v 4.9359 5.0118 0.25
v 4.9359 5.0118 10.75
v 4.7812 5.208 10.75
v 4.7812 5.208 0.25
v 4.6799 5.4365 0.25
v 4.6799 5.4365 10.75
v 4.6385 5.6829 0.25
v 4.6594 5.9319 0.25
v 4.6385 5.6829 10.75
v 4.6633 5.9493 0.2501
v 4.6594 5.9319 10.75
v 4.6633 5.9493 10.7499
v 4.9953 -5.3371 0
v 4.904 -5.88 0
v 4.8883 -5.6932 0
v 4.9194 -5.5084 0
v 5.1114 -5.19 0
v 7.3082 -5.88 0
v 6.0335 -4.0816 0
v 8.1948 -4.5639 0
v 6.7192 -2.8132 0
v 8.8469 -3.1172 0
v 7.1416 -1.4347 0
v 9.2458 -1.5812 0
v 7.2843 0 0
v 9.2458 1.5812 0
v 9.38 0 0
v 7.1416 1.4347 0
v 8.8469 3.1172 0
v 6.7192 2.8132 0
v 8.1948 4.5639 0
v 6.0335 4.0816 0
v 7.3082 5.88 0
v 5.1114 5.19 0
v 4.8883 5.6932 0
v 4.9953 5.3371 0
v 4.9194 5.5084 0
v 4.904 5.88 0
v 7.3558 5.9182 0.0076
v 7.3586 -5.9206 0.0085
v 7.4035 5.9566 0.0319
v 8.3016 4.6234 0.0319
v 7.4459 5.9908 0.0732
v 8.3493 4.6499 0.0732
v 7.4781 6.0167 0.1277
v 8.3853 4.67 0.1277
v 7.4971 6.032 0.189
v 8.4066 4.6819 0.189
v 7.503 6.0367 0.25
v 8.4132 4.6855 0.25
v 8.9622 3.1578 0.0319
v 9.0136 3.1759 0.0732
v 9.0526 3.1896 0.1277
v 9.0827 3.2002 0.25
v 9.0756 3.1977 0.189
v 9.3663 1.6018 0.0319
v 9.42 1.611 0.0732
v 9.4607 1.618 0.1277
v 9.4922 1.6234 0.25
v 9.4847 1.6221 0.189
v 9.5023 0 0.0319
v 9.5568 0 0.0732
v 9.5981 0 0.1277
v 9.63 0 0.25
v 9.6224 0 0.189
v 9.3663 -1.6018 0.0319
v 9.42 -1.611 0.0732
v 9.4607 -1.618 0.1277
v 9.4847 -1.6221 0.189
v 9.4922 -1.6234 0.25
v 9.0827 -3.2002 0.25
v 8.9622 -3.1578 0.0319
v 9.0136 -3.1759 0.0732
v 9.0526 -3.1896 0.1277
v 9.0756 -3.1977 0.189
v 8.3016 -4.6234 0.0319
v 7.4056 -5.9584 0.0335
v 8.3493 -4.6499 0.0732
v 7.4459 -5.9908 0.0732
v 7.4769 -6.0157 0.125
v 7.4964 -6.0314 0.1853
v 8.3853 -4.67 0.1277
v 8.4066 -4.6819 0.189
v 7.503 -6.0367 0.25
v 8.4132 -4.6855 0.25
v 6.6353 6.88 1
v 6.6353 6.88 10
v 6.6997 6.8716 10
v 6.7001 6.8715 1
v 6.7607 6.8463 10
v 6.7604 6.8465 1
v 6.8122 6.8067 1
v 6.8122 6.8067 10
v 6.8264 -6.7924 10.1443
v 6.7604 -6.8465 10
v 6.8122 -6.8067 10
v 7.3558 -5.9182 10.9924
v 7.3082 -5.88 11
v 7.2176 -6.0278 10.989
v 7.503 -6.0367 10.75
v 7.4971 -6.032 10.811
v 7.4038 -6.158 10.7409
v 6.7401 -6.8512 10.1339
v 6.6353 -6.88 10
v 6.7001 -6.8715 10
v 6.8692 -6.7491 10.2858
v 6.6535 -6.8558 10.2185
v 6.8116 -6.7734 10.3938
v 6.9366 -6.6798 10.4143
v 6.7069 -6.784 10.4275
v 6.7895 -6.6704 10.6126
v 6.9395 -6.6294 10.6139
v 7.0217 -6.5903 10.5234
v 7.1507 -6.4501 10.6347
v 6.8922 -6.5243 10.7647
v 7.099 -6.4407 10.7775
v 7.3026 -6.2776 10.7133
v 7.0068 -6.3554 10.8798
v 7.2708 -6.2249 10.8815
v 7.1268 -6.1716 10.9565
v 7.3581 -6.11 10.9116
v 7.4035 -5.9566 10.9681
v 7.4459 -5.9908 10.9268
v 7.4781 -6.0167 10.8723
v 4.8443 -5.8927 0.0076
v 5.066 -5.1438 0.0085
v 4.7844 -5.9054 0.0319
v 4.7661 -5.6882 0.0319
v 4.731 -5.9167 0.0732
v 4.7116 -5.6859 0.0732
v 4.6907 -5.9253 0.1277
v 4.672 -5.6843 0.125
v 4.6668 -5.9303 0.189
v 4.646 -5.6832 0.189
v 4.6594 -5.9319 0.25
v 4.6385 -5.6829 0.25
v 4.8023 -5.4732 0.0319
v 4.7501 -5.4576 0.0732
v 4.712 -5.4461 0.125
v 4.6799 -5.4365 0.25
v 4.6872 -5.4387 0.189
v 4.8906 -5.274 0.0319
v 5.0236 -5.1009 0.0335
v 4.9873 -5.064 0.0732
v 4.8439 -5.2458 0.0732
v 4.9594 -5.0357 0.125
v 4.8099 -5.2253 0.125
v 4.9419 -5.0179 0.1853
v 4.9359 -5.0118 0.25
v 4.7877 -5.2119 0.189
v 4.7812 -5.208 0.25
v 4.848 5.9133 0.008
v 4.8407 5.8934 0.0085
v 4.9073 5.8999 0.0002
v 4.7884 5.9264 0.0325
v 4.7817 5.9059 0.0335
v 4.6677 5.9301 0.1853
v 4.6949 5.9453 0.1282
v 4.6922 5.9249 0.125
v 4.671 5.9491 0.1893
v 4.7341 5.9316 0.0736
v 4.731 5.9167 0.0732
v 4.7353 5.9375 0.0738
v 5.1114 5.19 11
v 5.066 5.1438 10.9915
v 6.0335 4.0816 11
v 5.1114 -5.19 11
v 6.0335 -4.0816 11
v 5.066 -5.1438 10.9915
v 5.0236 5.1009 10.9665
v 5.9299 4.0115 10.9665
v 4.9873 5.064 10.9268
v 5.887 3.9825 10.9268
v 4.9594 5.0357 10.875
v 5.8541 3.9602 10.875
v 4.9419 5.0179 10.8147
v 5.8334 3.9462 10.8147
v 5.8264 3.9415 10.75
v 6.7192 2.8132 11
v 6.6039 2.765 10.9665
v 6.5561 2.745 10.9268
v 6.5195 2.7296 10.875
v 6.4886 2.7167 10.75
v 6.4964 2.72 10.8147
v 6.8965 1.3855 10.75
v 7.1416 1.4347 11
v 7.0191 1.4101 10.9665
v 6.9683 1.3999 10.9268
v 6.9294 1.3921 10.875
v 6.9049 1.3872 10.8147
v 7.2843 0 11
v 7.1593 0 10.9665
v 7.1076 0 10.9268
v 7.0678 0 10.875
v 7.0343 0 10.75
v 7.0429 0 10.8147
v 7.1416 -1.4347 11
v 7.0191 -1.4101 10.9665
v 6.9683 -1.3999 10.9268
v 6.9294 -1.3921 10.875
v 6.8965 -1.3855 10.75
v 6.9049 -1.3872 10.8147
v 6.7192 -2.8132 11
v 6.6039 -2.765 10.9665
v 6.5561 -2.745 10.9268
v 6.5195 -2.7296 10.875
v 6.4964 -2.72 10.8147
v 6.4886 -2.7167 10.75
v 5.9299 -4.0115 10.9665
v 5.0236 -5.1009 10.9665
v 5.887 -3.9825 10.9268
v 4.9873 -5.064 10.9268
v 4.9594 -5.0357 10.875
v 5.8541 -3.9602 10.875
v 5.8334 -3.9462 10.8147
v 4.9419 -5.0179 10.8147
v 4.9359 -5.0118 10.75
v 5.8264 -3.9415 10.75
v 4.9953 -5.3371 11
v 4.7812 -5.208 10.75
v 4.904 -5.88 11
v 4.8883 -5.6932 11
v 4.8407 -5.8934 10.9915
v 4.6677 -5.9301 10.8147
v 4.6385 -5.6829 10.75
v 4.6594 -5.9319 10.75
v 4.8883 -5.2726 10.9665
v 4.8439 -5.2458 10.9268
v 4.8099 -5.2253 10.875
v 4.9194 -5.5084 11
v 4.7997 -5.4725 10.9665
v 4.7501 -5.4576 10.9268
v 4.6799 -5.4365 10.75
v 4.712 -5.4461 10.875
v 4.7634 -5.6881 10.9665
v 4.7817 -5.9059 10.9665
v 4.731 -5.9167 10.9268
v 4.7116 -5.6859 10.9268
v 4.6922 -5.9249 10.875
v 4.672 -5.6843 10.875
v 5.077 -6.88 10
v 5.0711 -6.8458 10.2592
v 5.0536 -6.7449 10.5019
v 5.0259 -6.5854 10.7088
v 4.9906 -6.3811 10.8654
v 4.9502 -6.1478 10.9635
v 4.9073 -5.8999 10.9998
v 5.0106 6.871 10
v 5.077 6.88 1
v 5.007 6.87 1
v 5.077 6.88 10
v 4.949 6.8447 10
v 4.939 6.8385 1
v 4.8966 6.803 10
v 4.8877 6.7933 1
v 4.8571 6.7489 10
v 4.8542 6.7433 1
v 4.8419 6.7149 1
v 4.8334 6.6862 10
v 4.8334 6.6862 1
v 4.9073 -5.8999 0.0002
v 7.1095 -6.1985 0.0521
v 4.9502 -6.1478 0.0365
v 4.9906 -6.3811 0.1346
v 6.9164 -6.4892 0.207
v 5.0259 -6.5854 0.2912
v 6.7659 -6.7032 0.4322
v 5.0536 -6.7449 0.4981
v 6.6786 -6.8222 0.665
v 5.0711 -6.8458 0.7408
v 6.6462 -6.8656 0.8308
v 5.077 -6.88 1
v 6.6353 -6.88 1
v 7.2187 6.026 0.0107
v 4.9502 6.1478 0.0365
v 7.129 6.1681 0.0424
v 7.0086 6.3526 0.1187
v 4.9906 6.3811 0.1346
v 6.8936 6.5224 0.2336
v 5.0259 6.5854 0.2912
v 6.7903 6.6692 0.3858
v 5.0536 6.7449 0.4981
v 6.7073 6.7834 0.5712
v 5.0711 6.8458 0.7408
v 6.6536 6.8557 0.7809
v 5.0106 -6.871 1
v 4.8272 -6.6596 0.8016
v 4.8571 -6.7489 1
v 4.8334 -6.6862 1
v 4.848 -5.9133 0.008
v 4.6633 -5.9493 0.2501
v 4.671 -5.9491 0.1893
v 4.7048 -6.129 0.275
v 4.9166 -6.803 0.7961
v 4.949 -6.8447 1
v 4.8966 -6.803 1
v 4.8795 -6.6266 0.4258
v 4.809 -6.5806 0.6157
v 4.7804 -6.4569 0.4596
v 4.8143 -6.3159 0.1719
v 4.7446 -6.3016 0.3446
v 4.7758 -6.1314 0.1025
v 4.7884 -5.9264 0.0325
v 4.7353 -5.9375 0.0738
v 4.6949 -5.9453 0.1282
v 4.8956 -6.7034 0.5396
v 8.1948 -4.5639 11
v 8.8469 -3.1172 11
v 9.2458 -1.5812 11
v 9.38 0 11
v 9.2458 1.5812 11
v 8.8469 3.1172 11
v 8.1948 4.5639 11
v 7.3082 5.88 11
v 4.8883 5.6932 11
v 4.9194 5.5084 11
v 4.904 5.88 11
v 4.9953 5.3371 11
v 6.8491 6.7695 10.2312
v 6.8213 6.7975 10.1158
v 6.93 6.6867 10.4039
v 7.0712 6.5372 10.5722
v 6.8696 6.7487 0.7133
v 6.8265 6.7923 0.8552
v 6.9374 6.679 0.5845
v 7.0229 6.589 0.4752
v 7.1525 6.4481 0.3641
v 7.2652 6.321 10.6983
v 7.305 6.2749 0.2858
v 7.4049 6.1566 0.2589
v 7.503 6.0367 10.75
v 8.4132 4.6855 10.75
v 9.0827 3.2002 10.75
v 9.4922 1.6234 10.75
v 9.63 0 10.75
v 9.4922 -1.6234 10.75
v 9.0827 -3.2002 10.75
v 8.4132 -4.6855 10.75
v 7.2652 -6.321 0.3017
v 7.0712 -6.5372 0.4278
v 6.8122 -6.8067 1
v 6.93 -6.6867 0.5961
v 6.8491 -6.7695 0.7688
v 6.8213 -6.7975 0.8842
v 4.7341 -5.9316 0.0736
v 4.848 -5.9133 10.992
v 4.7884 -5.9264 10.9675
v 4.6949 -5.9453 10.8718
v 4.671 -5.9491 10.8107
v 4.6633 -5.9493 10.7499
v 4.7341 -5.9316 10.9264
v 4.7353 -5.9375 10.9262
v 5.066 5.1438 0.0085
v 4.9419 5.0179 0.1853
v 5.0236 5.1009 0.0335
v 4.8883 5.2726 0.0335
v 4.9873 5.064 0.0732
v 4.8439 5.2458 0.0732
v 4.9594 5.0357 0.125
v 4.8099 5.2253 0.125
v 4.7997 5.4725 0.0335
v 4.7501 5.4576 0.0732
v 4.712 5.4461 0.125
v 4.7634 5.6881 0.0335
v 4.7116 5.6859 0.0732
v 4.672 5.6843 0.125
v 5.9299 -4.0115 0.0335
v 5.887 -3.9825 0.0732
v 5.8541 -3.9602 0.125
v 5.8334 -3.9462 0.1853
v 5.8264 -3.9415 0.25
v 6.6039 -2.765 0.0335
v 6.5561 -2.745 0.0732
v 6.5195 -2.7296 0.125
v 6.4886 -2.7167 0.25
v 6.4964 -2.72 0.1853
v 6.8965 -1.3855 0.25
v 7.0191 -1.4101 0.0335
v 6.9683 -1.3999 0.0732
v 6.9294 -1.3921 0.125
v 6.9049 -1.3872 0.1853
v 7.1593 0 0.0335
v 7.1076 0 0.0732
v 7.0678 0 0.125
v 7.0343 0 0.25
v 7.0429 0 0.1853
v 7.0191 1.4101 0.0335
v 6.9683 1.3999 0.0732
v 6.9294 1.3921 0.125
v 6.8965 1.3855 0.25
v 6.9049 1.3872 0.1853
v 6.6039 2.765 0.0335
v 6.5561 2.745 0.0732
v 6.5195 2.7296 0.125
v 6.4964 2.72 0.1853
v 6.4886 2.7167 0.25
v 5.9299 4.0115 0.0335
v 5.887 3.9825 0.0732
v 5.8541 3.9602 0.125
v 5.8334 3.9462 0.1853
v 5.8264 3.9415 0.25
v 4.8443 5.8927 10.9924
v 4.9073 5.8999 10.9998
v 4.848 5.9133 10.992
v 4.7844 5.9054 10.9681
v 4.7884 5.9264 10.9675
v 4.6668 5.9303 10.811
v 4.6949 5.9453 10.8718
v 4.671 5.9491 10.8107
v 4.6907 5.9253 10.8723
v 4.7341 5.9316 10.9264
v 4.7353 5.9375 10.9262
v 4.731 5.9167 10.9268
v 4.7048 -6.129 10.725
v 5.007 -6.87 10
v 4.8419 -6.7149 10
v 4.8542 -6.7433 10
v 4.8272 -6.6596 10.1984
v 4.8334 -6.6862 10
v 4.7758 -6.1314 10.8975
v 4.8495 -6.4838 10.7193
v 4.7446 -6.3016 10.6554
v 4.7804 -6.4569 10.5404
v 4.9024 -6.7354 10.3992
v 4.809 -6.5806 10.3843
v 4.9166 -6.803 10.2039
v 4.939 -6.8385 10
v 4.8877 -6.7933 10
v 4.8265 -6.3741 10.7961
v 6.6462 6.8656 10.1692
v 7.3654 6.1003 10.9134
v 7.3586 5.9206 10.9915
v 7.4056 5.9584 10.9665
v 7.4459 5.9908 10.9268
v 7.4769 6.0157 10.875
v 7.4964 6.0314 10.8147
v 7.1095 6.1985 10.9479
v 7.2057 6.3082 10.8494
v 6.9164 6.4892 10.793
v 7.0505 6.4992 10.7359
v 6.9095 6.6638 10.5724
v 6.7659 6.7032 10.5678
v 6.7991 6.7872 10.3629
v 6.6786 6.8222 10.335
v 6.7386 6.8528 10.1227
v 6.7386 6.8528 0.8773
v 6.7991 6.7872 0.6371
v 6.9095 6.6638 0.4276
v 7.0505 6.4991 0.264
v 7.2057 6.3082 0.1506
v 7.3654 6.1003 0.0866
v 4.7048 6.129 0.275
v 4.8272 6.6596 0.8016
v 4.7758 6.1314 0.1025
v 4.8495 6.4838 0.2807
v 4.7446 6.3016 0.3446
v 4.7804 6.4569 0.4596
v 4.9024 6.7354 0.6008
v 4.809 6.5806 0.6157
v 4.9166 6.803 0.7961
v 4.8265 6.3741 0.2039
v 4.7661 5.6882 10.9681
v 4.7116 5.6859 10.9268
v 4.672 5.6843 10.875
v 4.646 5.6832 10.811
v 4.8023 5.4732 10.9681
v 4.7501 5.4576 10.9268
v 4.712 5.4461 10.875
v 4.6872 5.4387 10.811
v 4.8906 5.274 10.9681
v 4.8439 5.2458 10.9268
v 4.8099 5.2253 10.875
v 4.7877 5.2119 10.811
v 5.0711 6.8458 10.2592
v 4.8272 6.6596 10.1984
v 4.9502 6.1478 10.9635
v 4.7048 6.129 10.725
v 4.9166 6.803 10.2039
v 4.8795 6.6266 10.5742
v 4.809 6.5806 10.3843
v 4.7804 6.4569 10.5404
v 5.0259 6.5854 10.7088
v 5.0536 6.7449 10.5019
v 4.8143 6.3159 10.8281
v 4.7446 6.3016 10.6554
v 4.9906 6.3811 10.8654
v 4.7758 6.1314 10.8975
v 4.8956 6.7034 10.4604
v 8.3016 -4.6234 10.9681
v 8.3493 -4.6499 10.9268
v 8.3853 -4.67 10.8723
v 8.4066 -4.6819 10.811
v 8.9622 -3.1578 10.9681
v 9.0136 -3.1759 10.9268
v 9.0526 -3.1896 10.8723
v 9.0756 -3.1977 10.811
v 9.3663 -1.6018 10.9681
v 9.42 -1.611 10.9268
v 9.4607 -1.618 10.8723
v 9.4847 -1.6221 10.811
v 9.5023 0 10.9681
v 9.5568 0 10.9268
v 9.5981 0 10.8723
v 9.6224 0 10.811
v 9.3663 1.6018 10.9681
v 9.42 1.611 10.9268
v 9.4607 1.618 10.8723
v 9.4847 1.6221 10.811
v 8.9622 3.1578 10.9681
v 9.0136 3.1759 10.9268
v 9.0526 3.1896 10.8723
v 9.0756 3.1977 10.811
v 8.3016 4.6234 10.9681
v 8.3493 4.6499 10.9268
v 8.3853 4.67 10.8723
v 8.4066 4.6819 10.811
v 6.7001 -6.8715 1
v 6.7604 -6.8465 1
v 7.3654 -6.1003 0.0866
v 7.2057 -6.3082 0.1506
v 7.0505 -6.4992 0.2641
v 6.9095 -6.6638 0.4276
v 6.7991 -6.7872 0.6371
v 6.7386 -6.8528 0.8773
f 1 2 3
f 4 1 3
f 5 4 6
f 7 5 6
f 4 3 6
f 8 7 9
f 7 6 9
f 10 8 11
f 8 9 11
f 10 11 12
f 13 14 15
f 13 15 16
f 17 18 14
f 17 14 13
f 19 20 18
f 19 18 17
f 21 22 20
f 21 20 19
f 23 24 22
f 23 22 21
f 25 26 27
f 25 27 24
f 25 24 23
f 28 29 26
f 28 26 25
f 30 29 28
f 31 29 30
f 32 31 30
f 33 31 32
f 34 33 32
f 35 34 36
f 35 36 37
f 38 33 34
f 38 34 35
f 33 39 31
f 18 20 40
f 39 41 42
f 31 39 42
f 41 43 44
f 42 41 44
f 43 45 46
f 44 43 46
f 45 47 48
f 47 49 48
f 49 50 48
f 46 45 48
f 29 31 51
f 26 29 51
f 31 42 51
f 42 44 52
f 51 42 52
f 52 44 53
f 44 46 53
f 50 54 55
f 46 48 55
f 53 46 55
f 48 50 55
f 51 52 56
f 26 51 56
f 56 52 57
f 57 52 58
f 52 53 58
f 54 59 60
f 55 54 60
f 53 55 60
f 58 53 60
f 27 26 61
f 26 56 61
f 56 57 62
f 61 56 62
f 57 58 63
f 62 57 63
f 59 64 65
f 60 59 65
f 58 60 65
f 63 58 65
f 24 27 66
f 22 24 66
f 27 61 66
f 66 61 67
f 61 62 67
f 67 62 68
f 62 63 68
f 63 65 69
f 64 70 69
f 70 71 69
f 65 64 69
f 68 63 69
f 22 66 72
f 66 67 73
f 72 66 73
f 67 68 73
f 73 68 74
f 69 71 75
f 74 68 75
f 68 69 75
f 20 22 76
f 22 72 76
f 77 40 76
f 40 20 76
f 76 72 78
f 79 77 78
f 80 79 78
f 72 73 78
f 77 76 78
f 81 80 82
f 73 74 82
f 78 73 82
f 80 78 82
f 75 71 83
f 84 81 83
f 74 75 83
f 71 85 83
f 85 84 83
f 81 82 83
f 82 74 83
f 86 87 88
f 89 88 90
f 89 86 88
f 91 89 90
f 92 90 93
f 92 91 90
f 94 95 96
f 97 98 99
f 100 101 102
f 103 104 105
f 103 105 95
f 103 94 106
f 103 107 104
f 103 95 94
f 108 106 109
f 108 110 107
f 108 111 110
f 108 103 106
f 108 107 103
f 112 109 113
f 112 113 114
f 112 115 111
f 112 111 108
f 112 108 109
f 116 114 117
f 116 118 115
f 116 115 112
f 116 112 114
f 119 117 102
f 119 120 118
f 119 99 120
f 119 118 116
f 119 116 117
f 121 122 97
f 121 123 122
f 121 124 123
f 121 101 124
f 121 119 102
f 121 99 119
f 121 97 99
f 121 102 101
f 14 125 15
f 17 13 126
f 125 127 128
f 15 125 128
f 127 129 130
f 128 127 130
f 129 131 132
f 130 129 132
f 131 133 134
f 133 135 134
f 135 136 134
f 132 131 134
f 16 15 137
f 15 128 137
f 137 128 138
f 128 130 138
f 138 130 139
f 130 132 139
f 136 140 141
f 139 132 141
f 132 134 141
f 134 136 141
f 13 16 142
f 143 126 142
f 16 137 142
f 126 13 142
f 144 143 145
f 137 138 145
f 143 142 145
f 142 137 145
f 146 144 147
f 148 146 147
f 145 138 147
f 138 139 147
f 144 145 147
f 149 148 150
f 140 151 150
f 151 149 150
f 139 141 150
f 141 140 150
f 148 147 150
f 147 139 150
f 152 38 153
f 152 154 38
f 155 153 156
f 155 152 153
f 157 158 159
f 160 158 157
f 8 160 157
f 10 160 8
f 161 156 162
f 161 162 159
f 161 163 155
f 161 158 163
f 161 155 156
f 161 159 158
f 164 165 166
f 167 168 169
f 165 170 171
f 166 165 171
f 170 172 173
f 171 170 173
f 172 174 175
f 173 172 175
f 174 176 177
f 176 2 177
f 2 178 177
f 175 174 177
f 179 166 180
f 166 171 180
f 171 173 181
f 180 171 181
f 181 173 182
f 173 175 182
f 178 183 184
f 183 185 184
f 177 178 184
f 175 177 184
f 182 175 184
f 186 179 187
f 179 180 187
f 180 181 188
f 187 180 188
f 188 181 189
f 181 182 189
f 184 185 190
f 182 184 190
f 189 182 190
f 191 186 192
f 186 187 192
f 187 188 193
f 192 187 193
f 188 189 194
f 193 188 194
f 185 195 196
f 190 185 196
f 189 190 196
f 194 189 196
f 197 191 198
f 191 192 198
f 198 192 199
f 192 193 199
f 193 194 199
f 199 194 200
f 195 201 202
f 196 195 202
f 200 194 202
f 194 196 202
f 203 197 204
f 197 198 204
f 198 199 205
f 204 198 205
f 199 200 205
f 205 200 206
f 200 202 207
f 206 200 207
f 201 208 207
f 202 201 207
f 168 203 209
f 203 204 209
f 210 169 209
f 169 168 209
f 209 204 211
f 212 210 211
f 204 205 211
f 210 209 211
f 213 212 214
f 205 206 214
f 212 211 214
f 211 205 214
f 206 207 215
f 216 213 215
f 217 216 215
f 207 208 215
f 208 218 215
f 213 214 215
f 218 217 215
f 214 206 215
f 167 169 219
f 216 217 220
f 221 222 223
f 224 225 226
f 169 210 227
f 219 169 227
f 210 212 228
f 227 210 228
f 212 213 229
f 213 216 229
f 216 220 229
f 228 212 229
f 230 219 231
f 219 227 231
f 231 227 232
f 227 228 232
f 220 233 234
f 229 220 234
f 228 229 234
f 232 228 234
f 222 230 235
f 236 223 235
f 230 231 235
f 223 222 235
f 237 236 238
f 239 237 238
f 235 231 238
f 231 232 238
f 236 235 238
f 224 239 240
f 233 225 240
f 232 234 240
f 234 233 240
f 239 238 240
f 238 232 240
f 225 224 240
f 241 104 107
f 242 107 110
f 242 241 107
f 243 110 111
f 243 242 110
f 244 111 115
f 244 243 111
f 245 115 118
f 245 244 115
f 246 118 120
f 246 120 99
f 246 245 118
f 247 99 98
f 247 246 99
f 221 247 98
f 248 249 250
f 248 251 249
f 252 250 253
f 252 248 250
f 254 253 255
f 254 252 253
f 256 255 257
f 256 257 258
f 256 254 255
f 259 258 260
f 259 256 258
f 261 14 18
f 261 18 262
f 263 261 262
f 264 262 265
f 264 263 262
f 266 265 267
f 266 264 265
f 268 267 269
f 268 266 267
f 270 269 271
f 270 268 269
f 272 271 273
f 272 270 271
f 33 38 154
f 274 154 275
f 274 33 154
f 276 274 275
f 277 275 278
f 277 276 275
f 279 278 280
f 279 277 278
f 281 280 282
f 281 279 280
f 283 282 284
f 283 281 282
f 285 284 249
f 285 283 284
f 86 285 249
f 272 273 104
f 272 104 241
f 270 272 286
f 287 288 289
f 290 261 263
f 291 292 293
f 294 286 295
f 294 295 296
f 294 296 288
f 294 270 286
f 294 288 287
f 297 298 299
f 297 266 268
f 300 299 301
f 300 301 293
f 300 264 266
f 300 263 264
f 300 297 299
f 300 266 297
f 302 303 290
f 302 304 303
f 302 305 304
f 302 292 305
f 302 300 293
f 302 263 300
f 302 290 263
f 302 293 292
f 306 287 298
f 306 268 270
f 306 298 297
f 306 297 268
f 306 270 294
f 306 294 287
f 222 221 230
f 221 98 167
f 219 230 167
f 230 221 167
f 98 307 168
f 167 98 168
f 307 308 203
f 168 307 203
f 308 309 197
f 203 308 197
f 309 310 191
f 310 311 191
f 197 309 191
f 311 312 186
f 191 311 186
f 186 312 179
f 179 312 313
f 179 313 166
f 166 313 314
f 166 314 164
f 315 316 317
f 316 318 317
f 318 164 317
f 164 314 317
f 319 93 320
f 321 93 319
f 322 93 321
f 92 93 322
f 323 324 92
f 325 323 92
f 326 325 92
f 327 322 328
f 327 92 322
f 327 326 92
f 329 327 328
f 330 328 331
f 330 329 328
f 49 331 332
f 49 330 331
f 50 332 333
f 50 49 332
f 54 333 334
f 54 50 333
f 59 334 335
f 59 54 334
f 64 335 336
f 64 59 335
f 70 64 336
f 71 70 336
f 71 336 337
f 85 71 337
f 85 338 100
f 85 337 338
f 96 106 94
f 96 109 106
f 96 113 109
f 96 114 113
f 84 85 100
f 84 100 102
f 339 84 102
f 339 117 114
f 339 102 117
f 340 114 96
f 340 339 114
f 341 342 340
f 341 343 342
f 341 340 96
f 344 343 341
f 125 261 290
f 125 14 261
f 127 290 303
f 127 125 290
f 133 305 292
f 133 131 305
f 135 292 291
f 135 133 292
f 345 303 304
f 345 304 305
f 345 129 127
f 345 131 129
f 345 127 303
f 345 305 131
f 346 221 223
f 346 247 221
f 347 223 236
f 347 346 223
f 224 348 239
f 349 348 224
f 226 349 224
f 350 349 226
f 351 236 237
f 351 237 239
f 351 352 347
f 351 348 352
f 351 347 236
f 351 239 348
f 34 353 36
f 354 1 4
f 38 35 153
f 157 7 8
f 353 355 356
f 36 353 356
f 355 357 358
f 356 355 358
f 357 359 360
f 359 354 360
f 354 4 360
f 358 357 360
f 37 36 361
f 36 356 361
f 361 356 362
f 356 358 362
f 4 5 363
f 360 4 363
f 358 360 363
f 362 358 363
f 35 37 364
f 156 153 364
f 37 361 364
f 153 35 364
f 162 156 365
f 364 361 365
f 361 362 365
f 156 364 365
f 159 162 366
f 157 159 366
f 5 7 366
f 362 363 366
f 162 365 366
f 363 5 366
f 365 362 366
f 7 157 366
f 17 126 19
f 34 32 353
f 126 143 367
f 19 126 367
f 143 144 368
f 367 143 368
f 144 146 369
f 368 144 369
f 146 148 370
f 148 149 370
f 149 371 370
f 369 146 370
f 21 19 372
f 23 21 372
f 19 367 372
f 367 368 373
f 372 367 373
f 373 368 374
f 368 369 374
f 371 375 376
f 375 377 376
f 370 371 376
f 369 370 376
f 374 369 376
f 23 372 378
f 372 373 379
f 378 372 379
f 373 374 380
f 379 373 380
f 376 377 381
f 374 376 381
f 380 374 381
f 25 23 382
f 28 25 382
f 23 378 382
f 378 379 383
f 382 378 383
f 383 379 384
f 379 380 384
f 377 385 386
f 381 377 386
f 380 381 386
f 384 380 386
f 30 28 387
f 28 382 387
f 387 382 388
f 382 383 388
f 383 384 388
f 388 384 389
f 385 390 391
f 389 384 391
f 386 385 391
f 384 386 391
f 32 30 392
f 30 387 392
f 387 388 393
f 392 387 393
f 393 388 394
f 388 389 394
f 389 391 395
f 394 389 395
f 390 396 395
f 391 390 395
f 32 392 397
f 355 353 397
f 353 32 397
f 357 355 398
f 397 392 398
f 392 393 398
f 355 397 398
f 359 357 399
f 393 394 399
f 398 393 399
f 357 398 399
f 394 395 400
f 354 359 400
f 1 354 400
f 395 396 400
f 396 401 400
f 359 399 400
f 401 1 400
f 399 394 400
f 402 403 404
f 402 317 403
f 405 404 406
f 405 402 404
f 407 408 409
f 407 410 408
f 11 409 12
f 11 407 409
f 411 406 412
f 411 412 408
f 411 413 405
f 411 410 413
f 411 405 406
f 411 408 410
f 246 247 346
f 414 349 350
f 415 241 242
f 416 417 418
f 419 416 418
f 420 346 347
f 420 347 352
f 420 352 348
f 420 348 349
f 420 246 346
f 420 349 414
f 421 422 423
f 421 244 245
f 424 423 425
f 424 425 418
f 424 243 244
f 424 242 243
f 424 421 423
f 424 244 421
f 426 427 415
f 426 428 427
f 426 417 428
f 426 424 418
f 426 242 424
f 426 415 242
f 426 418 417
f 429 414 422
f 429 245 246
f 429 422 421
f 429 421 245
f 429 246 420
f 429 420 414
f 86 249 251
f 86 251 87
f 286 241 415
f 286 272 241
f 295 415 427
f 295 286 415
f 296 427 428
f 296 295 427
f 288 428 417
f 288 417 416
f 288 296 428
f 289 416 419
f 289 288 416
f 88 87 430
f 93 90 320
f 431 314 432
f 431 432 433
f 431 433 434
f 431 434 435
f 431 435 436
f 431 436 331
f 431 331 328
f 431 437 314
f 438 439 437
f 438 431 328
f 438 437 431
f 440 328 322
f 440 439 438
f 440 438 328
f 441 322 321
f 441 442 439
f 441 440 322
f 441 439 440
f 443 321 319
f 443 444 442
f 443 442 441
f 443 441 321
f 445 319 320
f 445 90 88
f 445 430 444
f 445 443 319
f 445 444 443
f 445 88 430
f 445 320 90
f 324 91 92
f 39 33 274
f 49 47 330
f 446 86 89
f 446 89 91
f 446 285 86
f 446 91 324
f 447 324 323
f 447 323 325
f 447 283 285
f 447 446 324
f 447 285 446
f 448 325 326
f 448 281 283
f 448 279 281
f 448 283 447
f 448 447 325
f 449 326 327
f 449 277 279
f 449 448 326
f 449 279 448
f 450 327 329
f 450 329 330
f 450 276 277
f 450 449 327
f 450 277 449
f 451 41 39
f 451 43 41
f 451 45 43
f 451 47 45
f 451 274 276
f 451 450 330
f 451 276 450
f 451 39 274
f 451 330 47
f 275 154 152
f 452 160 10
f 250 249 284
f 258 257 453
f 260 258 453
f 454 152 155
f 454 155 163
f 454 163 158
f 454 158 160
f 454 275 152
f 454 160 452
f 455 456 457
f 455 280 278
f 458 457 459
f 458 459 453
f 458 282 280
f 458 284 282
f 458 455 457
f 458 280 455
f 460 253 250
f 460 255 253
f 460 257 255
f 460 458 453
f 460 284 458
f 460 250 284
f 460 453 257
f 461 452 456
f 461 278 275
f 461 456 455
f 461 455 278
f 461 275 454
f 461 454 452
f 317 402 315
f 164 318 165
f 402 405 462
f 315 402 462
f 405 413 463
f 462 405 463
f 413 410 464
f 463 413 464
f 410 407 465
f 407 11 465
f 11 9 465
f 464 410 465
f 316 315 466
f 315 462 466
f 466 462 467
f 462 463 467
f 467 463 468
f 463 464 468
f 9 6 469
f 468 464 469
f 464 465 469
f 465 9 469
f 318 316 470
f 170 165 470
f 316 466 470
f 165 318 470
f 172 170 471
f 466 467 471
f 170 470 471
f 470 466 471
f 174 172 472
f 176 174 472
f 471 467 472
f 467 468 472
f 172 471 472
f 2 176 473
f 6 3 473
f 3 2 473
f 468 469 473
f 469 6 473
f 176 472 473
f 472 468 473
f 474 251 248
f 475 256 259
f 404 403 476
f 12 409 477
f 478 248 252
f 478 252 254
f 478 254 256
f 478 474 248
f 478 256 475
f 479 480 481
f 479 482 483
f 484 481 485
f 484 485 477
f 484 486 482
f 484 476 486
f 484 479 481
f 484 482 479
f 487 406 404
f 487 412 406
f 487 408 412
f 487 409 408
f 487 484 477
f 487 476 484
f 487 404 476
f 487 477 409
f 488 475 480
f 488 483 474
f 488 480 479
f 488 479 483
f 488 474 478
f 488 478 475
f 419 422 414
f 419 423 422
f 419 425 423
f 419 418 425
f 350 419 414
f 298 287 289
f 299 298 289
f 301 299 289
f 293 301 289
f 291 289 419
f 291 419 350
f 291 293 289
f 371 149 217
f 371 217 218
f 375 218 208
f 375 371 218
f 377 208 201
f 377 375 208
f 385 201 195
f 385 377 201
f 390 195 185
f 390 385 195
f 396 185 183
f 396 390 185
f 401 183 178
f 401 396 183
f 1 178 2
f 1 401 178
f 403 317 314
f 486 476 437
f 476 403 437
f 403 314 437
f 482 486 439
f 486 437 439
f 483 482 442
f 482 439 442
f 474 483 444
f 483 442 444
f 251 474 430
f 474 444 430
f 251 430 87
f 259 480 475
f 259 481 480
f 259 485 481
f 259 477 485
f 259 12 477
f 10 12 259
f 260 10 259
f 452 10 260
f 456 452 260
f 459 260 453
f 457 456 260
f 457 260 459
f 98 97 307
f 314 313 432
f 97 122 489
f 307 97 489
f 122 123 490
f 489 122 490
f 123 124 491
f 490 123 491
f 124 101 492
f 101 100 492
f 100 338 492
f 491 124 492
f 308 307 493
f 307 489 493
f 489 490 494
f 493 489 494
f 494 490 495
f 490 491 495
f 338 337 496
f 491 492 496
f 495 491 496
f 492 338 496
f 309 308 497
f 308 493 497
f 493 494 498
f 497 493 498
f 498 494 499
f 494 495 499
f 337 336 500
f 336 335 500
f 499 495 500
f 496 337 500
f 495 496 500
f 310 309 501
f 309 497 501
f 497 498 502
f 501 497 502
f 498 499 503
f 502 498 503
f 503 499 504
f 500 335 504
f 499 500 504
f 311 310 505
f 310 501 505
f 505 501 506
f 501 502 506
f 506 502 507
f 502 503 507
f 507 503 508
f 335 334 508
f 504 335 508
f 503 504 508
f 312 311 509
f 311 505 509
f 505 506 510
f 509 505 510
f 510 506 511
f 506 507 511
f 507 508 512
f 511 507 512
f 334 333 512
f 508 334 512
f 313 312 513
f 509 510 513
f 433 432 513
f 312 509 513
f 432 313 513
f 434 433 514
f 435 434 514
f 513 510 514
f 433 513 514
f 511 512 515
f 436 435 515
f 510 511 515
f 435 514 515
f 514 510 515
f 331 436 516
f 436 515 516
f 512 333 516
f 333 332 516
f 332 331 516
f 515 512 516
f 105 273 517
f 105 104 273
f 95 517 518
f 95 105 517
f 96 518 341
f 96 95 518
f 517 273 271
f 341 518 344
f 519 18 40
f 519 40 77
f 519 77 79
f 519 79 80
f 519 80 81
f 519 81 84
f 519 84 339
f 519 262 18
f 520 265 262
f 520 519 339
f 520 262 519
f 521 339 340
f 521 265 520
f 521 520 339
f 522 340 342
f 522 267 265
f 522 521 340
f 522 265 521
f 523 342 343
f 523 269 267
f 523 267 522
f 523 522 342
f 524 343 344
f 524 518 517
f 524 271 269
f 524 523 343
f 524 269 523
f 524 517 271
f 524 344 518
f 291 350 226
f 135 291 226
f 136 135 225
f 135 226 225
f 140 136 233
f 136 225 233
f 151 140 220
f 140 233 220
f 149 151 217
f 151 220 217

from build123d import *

# Parameters (mm, degrees)
BOSS_EXTRUDE1_DEPTH = 11
FILLET1_R           = 1
FILLET2_R           = 1
FILLET3_R           = 0.25


with BuildPart() as part:
    # Sketch1 → Boss-Extrude1 (new body)
    with BuildSketch(Plane.XY):
        with BuildLine():
            Line((6.738137725, -6.88), (4.878137725, -6.88))
            Line((4.878137725, -6.88), (4.531835438, -5.38))
            ThreePointArc((4.531835438, -5.38), (7.034339517, 0), (4.531835438, 5.38))
            Line((4.531835438, 5.38), (4.878137725, 6.88))
            Line((4.878137725, 6.88), (6.738137725, 6.88))
            ThreePointArc((6.738137725, 6.88), (9.63, 0), (6.738137725, -6.88))
        make_face()
    extrude(amount=BOSS_EXTRUDE1_DEPTH)

    # Fillet1
    fillet1_edges = [part.edges().sort_by_distance(p)[0] for p in [
        (4.531835438, -5.38, 5.5),
        (4.531835438, 5.38, 5.5),
    ]]
    fillet(fillet1_edges, radius=FILLET1_R)

    # Fillet2
    fillet2_edges = [part.edges().sort_by_distance(p)[0] for p in [
        (5.808137725, -6.88, 0),
        (5.808137725, -6.88, 11),
        (5.808137725, 6.88, 11),
        (5.808137725, 6.88, 0),
    ]]
    fillet(fillet2_edges, radius=FILLET2_R)

    # Fillet3
    fillet3_edges = [part.edges().sort_by_distance(p)[0] for p in [
        (7.034339517, 0, 0),
        (4.687877266, 5.411310183, 0),
        (7.034339517, 0, 11),
        (4.687877266, -5.411310183, 11),
        (6.738137725, -6.88, 5.5),
        (4.878137725, -6.88, 5.5),
        (9.63, 0, 0),
        (6.738137725, 6.88, 5.5),
        (9.63, 0, 11),
        (7.064336587, 6.544619823, 0.252818297),
        (7.064336587, 6.544619823, 10.747181703),
        (7.064336589, -6.544619821, 10.747181705),
        (7.064336577, -6.544619807, 0.2528183),
        (4.687877266, -5.411310183, 0),
        (4.655934772, -5.914769545, 10.999395357),
        (4.655934772, -5.914769545, 0.000604643),
        (4.815123489, -6.607055355, 10.686578845),
        (4.815123489, -6.607055355, 0.313421155),
        (4.687877266, 5.411310183, 11),
        (4.655934776, 5.914769544, 0.00060465),
        (4.655934776, 5.914769544, 10.99939535),
        (4.878137725, 6.88, 5.5),
        (4.815123489, 6.607055355, 0.313421155),
        (4.815123489, 6.607055355, 10.686578845),
    ]]
    fillet(fillet3_edges, radius=FILLET3_R)


solid = part.part
